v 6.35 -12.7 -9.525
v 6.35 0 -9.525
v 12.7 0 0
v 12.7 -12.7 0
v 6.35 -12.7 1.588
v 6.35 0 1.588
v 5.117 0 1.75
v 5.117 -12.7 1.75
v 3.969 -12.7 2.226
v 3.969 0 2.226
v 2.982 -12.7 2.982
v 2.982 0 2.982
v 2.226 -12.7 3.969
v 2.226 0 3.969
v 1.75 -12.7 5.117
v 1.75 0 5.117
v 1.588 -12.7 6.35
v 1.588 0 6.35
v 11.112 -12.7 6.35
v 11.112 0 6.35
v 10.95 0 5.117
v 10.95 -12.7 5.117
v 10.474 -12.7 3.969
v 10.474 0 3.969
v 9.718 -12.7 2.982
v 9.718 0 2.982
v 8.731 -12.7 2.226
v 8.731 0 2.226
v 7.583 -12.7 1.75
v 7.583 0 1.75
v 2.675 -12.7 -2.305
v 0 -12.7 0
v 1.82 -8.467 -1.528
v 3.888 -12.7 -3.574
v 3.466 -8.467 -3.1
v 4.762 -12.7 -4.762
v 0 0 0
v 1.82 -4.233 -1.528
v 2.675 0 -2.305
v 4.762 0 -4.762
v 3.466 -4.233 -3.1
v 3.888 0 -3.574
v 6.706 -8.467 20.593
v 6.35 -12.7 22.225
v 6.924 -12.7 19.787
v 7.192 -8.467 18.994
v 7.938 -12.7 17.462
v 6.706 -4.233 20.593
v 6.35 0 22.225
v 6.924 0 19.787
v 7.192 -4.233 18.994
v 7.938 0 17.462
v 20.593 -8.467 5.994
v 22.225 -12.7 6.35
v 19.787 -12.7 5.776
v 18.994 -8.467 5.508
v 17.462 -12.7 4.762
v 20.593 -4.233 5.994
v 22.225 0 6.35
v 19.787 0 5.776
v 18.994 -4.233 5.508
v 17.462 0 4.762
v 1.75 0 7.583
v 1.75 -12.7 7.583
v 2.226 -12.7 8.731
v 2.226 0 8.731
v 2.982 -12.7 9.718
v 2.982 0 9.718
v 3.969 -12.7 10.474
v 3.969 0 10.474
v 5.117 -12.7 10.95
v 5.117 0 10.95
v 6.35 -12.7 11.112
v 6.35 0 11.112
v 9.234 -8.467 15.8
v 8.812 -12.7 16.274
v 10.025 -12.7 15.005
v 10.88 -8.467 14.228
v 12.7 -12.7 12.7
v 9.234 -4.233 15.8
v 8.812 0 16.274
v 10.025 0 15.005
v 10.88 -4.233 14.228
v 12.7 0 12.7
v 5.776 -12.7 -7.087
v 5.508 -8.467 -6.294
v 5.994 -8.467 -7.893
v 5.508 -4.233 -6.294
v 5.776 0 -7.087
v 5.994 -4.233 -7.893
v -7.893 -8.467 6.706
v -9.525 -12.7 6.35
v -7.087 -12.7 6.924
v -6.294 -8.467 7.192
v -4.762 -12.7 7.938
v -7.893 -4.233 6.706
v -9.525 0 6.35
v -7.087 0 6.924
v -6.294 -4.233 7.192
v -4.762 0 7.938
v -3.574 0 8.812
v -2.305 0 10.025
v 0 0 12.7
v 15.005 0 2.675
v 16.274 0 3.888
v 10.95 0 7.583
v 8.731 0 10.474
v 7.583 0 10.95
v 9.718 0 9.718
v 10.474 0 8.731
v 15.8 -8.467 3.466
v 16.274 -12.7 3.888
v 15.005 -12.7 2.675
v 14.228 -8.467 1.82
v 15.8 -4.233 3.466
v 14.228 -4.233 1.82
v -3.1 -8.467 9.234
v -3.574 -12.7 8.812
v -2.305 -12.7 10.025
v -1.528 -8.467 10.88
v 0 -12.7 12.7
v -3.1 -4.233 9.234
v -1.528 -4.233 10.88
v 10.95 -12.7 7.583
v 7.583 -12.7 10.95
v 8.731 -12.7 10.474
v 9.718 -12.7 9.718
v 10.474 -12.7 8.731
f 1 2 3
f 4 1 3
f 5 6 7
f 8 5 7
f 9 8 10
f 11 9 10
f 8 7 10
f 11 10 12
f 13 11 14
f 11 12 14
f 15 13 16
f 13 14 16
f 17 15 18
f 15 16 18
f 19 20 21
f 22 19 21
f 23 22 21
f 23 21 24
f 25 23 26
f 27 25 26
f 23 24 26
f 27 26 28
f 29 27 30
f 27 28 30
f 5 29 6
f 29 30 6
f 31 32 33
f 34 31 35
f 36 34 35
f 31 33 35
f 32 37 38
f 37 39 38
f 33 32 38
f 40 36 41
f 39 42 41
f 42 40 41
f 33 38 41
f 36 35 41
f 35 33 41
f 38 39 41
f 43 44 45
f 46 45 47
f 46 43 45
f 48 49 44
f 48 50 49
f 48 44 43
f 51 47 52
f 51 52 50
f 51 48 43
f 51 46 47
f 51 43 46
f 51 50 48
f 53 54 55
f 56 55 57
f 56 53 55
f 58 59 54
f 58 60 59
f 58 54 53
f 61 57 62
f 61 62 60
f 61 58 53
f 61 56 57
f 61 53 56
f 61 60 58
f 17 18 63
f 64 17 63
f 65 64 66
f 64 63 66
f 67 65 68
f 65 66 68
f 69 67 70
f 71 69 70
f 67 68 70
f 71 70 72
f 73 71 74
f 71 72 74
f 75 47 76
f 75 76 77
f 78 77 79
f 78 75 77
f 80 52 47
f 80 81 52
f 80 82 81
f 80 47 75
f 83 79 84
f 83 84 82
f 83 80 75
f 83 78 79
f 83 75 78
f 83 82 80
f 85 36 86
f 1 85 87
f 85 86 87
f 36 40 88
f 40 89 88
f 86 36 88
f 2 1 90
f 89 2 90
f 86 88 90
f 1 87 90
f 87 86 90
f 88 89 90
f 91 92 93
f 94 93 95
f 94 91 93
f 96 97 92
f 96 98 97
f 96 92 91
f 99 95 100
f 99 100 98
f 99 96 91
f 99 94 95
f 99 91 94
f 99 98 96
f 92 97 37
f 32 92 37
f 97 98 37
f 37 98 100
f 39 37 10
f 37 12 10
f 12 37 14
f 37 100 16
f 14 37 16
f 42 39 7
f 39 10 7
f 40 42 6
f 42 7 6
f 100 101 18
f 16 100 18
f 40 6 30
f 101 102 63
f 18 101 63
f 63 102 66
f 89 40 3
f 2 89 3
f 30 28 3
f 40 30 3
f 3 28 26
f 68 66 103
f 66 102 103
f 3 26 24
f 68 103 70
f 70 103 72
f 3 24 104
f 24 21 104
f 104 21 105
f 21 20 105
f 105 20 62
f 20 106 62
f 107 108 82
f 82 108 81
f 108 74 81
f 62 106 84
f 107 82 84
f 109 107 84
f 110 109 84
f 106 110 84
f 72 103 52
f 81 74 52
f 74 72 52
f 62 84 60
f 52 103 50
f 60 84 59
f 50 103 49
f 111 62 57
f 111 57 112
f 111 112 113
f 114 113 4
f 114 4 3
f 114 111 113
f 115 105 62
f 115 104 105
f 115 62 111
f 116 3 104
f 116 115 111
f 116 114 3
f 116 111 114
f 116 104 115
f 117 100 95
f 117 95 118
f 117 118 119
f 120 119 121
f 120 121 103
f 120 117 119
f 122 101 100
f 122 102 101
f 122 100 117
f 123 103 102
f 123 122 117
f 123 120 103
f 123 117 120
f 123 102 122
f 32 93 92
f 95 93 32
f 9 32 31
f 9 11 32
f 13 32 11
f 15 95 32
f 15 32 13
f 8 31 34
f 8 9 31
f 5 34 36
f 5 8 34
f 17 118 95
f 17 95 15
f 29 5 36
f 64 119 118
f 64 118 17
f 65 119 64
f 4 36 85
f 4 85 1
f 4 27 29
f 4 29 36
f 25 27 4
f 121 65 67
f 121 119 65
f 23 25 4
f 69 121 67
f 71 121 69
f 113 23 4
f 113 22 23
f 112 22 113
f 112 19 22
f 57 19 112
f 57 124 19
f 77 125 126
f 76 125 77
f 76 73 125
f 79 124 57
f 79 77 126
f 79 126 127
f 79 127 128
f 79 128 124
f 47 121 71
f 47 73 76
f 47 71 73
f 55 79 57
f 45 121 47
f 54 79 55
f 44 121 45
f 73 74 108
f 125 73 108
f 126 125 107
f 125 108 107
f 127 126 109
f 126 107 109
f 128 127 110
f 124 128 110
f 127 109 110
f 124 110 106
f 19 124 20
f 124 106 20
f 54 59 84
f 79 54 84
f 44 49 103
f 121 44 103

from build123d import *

# Parameters (mm, degrees)
F1_DEPTH = 12.7


with BuildPart() as f1:
    # F0 (on Front) → F1 (new body)
    with BuildSketch(Plane.XZ):
        with BuildLine():
            Line((0, 6.35), (0, 0))
            Line((0, 0), (3.175, 0))
            Line((3.175, 0), (6.35, 0))
            Line((6.35, 0), (6.35, 1.5875))
            ThreePointArc((6.35, 1.5875), (2.9824039546, 2.9824039546), (1.5875, 6.35))
            Line((1.5875, 6.35), (0, 6.35))
        make_face()
        Polygon((-9.525, 6.35), (0, 0), (0, 6.35), (-4.7625, 6.35), align=None)
        with BuildLine():
            Line((3.175, 0), (0, 0))
            add(Edge.make_bspline(
                [(0, 0), (1.8490116871, -1.5200703196), (3.6980233742, -3.0401406392), (4.7625, -4.7625)],
                knots=[0, 0, 0, 0, 0.5366707034, 0.5366707034, 0.5366707034, 0.5366707034], degree=3))
            Line((4.7625, -4.7625), (6.35, -4.7625))
            Line((6.35, -4.7625), (6.35, 0))
            Line((6.35, 0), (3.175, 0))
        make_face()
        with BuildLine():
            Line((-4.7625, 6.35), (0, 6.35))
            Line((0, 6.35), (0, 9.525))
            Line((0, 9.525), (0, 12.7))
            add(Edge.make_bspline(
                [(-4.7625, 7.9375), (-3.0401406392, 9.0019766258), (-1.5200703196, 10.8509883129), (0, 12.7)],
                knots=[0.4633292966, 0.4633292966, 0.4633292966, 0.4633292966, 1, 1, 1, 1], degree=3))
            Line((-4.7625, 7.9375), (-4.7625, 6.35))
        make_face()
        with BuildLine():
            Line((0, 9.525), (0, 6.35))
            Line((0, 6.35), (1.5875, 6.35))
            ThreePointArc((1.5875, 6.35), (2.9824039546, 9.7175960454), (6.35, 11.1125))
            Line((6.35, 11.1125), (6.35, 12.7))
            Line((6.35, 12.7), (3.175, 12.7))
            Line((3.175, 12.7), (0, 12.7))
            Line((0, 12.7), (0, 9.525))
        make_face()
        with BuildLine():
            Line((6.35, -4.7625), (4.7625, -4.7625))
            add(Edge.make_bspline(
                [(4.7625, -4.7625), (5.6815052729, -6.2494817673), (6.0157526364, -7.8872408837), (6.35, -9.525)],
                knots=[0.5366707034, 0.5366707034, 0.5366707034, 0.5366707034, 1, 1, 1, 1], degree=3))
            Line((6.35, -9.525), (6.35, -4.7625))
        make_face()
        with BuildLine():
            add(Edge.make_bspline(
                [(-9.525, 6.35), (-7.8872408837, 6.6842473636), (-6.2494817673, 7.0184947271), (-4.7625, 7.9375)],
                knots=[0, 0, 0, 0, 0.4633292966, 0.4633292966, 0.4633292966, 0.4633292966], degree=3))
            Line((-9.525, 6.35), (-4.7625, 6.35))
            Line((-4.7625, 6.35), (-4.7625, 7.9375))
        make_face()
        with BuildLine():
            Line((6.35, 1.5875), (6.35, 0))
            Line((6.35, 0), (12.7, 0))
            Line((12.7, 0), (12.7, 3.175))
            Line((12.7, 3.175), (12.7, 6.35))
            Line((12.7, 6.35), (11.1125, 6.35))
            ThreePointArc((11.1125, 6.35), (9.7175960454, 2.9824039546), (6.35, 1.5875))
        make_face()
        Polygon((12.7, 0), (6.35, 0), (6.35, -4.7625), (6.35, -9.525), align=None)
        with BuildLine():
            Line((12.7, 3.175), (12.7, 0))
            add(Edge.make_bspline(
                [(17.4625, 4.7625), (15.7401406392, 3.6980233742), (14.2200703196, 1.8490116871), (12.7, 0)],
                knots=[0.4633292966, 0.4633292966, 0.4633292966, 0.4633292966, 1, 1, 1, 1], degree=3))
            Line((17.4625, 4.7625), (17.4625, 6.35))
            Line((17.4625, 6.35), (12.7, 6.35))
            Line((12.7, 6.35), (12.7, 3.175))
        make_face()
        Polygon((6.35, 22.225), (0, 12.7), (3.175, 12.7), (6.35, 12.7), (6.35, 17.4625), align=None)
        with BuildLine():
            Line((6.35, 12.7), (6.35, 11.1125))
            ThreePointArc((6.35, 11.1125), (9.7175960454, 9.7175960454), (11.1125, 6.35))
            Line((11.1125, 6.35), (12.7, 6.35))
            Line((12.7, 6.35), (12.7, 12.7))
            Line((12.7, 12.7), (9.525, 12.7))
            Line((9.525, 12.7), (6.35, 12.7))
        make_face()
        with BuildLine():
            Line((17.4625, 6.35), (17.4625, 4.7625))
            add(Edge.make_bspline(
                [(22.225, 6.35), (20.5872408837, 6.0157526364), (18.9494817673, 5.6815052729), (17.4625, 4.7625)],
                knots=[0, 0, 0, 0, 0.4633292966, 0.4633292966, 0.4633292966, 0.4633292966], degree=3))
            Line((22.225, 6.35), (17.4625, 6.35))
        make_face()
        with BuildLine():
            add(Edge.make_bspline(
                [(6.35, 22.225), (6.6842473636, 20.5872408837), (7.0184947271, 18.9494817673), (7.9375, 17.4625)],
                knots=[0, 0, 0, 0, 0.4633292966, 0.4633292966, 0.4633292966, 0.4633292966], degree=3))
            Line((6.35, 22.225), (6.35, 17.4625))
            Line((6.35, 17.4625), (7.9375, 17.4625))
        make_face()
        with BuildLine():
            Line((6.35, 17.4625), (6.35, 12.7))
            Line((6.35, 12.7), (9.525, 12.7))
            Line((9.525, 12.7), (12.7, 12.7))
            add(Edge.make_bspline(
                [(7.9375, 17.4625), (9.0019766258, 15.7401406392), (10.8509883129, 14.2200703196), (12.7, 12.7)],
                knots=[0.4633292966, 0.4633292966, 0.4633292966, 0.4633292966, 1, 1, 1, 1], degree=3))
            Line((7.9375, 17.4625), (6.35, 17.4625))
        make_face()
        Polygon((12.7, 12.7), (12.7, 6.35), (17.4625, 6.35), (22.225, 6.35), align=None)
    extrude(amount=F1_DEPTH)


solid = f1.part
